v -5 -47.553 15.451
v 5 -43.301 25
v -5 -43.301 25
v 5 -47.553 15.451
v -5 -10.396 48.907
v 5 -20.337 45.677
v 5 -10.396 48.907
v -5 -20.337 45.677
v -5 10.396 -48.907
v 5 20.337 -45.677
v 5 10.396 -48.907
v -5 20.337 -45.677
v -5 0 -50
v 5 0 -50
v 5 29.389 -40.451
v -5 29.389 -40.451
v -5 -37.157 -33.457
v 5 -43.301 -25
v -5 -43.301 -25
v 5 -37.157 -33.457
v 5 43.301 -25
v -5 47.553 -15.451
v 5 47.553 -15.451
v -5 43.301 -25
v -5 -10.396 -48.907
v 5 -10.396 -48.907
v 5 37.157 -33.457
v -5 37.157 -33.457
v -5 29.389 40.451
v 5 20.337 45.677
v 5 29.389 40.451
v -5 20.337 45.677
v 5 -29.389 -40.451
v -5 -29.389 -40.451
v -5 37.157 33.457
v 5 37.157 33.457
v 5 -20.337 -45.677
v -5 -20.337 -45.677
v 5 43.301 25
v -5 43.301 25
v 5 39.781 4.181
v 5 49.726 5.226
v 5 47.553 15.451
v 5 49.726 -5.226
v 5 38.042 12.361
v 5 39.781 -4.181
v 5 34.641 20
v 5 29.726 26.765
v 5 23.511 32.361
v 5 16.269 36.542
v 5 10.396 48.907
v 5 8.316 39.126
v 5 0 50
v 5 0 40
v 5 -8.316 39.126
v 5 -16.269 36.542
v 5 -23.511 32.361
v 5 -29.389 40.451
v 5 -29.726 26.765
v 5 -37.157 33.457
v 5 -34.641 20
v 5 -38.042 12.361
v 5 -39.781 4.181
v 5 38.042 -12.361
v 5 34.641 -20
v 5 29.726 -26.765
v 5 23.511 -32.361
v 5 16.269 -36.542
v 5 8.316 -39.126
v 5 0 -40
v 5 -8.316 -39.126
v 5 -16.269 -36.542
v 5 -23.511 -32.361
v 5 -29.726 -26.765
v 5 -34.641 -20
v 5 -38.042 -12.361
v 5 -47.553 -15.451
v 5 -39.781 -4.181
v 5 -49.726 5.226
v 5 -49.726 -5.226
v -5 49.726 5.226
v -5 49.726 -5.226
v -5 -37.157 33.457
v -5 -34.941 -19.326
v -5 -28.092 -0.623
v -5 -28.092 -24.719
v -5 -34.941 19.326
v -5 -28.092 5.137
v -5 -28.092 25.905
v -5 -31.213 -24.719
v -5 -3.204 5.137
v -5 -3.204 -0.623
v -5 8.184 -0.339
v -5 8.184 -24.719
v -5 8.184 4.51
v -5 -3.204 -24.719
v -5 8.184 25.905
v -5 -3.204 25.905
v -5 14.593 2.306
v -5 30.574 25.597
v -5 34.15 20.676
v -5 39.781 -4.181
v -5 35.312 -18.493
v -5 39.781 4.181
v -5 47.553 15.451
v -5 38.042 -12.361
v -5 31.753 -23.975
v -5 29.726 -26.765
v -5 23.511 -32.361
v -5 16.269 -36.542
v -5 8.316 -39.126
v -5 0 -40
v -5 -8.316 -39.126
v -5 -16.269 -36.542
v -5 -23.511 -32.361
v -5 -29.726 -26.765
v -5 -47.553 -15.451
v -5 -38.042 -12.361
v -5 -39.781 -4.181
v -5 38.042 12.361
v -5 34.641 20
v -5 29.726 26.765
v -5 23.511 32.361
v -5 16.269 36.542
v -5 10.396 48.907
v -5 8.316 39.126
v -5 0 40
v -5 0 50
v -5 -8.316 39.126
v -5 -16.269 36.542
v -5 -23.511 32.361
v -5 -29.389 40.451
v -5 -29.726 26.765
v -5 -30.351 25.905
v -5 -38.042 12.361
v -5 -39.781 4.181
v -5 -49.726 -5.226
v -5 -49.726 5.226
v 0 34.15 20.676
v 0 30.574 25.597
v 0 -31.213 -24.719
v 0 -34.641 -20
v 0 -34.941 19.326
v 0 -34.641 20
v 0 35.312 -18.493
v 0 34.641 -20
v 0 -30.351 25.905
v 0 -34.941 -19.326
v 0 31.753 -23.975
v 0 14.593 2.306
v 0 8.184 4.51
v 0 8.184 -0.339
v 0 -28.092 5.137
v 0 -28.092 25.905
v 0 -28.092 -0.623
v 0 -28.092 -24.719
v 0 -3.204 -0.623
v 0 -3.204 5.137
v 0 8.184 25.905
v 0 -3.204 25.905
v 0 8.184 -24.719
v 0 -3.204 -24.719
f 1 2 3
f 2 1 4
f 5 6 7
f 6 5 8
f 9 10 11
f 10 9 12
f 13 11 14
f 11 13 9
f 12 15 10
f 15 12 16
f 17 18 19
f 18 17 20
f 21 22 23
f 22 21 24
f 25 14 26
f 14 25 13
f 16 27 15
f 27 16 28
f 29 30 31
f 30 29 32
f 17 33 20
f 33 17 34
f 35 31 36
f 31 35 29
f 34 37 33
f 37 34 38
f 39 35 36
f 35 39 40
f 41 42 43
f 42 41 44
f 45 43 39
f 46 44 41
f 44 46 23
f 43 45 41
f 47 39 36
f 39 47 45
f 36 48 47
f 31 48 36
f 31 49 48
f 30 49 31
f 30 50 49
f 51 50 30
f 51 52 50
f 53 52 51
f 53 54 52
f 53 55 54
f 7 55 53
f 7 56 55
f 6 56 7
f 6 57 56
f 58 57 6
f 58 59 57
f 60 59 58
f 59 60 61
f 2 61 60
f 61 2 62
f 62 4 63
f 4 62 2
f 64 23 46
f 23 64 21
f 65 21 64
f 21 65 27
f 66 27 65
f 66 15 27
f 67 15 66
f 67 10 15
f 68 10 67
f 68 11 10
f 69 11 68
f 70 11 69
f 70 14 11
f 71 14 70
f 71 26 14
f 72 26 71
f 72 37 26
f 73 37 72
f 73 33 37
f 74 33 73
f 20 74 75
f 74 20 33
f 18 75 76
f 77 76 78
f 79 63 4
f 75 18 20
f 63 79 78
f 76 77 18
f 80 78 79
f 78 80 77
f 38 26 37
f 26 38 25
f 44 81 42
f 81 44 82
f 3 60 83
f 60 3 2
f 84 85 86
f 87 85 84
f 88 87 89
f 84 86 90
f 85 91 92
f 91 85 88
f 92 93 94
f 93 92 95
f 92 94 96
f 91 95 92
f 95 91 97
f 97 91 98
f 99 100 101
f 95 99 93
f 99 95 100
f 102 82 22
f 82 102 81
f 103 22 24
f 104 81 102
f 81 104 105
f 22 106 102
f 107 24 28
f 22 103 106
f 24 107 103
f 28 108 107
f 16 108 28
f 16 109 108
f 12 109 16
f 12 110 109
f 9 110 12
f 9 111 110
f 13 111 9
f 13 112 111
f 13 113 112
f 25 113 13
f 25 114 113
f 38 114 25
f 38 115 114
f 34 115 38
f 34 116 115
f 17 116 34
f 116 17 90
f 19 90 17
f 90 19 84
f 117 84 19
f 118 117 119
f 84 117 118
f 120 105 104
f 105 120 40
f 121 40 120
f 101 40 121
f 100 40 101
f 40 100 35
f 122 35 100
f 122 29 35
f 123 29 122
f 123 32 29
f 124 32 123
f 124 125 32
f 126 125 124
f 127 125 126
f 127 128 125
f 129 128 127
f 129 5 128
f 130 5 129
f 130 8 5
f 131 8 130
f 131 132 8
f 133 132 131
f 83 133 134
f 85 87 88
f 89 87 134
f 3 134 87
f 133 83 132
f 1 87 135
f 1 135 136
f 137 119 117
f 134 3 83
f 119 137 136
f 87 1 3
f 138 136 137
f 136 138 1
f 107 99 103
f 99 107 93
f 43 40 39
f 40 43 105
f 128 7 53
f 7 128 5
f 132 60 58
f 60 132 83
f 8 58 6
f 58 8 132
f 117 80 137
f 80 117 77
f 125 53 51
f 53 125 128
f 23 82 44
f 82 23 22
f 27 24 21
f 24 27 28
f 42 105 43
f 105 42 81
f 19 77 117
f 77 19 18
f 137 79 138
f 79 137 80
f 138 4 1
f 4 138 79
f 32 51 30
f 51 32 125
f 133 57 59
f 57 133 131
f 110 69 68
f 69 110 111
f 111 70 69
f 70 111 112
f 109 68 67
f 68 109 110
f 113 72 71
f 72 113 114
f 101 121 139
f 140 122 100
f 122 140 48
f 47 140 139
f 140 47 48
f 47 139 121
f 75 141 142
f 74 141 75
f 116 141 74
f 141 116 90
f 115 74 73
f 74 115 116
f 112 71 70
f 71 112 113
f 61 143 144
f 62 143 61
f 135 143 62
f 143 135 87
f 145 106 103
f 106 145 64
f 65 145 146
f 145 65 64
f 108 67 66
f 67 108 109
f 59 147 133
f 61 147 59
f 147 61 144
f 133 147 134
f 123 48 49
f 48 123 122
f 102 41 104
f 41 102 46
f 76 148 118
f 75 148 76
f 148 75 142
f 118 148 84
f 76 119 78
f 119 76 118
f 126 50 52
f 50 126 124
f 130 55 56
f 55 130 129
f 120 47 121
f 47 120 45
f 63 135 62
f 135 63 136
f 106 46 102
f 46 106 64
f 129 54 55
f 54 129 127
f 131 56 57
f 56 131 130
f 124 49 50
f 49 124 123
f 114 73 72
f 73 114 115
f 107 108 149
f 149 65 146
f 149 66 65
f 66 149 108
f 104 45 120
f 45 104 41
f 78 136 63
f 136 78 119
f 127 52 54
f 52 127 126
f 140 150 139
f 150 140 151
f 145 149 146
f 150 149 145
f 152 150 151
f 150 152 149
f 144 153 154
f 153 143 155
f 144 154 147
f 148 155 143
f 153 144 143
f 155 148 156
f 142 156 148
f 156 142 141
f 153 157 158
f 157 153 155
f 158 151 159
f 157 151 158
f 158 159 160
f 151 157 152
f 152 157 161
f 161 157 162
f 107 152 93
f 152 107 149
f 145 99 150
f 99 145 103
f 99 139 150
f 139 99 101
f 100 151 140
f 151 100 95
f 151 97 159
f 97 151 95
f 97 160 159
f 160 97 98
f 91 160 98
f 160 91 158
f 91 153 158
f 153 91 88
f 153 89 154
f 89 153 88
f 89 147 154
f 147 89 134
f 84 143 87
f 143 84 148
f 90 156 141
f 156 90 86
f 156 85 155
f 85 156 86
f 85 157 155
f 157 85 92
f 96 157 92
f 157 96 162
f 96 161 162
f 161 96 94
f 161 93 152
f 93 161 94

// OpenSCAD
//Logo();

module Logo() {
    
    size = 50;
    
    difference() {
        
    translate([0, 20, 50]) 
        rotate([0, 90, 0])  
        linear_extrude(30) circle(size*2);
    
    translate([0, 20, 50]) 
        rotate([0, 90, 0])  
        linear_extrude(30) circle(size*2*0.8);
    }
    
    
    translate([0, 50, 0]) cube([30,30,100]);
    translate([0, 0, 35]) cube([30,80,30]);
   
    
    cube([30,30,100]);
    
    rotate([45, 0, 0]) 
        translate([0, 25, 25]) cube([30,30,60]);
    
    rotate([-45, 0, 0]) 
        translate([0, -50, -25]) cube([30,30,60]);
}

// Parameters
circle_thickness = 10;  // Thickness of the circle
letter_height = 40;    // Height of the letters
letter_depth = 5;      // Depth of the letters
font_size = 50;        // Font size for the letters
circle_diameter = font_size*2; // Diameter of the circle
font_style = "Impact";  // Font style
letter_spacing = 0.5;  // Adjust spacing between letters

// Main model
module logo() {
    

    rotate([0, 90, 0]) 
    difference() {
        cylinder(d = circle_diameter, h = circle_thickness, center = true);
        cylinder(d = circle_diameter - circle_thickness * 2, h = circle_thickness, center = true);
    }

    // Letters "HK" with adjusted alignment

    rotate([90, 00, 0]) 
        rotate([0, 90, 0]) 
        translate([-font_size/4, 0, -circle_thickness/2])
            linear_extrude(height = letter_depth)
                text("H K", 
                    size = font_size, 
                    valign = "center", 
                    halign = "center", 
                    spacing = letter_spacing, 
                    font = font_style);
}

// Render logo
logo();
